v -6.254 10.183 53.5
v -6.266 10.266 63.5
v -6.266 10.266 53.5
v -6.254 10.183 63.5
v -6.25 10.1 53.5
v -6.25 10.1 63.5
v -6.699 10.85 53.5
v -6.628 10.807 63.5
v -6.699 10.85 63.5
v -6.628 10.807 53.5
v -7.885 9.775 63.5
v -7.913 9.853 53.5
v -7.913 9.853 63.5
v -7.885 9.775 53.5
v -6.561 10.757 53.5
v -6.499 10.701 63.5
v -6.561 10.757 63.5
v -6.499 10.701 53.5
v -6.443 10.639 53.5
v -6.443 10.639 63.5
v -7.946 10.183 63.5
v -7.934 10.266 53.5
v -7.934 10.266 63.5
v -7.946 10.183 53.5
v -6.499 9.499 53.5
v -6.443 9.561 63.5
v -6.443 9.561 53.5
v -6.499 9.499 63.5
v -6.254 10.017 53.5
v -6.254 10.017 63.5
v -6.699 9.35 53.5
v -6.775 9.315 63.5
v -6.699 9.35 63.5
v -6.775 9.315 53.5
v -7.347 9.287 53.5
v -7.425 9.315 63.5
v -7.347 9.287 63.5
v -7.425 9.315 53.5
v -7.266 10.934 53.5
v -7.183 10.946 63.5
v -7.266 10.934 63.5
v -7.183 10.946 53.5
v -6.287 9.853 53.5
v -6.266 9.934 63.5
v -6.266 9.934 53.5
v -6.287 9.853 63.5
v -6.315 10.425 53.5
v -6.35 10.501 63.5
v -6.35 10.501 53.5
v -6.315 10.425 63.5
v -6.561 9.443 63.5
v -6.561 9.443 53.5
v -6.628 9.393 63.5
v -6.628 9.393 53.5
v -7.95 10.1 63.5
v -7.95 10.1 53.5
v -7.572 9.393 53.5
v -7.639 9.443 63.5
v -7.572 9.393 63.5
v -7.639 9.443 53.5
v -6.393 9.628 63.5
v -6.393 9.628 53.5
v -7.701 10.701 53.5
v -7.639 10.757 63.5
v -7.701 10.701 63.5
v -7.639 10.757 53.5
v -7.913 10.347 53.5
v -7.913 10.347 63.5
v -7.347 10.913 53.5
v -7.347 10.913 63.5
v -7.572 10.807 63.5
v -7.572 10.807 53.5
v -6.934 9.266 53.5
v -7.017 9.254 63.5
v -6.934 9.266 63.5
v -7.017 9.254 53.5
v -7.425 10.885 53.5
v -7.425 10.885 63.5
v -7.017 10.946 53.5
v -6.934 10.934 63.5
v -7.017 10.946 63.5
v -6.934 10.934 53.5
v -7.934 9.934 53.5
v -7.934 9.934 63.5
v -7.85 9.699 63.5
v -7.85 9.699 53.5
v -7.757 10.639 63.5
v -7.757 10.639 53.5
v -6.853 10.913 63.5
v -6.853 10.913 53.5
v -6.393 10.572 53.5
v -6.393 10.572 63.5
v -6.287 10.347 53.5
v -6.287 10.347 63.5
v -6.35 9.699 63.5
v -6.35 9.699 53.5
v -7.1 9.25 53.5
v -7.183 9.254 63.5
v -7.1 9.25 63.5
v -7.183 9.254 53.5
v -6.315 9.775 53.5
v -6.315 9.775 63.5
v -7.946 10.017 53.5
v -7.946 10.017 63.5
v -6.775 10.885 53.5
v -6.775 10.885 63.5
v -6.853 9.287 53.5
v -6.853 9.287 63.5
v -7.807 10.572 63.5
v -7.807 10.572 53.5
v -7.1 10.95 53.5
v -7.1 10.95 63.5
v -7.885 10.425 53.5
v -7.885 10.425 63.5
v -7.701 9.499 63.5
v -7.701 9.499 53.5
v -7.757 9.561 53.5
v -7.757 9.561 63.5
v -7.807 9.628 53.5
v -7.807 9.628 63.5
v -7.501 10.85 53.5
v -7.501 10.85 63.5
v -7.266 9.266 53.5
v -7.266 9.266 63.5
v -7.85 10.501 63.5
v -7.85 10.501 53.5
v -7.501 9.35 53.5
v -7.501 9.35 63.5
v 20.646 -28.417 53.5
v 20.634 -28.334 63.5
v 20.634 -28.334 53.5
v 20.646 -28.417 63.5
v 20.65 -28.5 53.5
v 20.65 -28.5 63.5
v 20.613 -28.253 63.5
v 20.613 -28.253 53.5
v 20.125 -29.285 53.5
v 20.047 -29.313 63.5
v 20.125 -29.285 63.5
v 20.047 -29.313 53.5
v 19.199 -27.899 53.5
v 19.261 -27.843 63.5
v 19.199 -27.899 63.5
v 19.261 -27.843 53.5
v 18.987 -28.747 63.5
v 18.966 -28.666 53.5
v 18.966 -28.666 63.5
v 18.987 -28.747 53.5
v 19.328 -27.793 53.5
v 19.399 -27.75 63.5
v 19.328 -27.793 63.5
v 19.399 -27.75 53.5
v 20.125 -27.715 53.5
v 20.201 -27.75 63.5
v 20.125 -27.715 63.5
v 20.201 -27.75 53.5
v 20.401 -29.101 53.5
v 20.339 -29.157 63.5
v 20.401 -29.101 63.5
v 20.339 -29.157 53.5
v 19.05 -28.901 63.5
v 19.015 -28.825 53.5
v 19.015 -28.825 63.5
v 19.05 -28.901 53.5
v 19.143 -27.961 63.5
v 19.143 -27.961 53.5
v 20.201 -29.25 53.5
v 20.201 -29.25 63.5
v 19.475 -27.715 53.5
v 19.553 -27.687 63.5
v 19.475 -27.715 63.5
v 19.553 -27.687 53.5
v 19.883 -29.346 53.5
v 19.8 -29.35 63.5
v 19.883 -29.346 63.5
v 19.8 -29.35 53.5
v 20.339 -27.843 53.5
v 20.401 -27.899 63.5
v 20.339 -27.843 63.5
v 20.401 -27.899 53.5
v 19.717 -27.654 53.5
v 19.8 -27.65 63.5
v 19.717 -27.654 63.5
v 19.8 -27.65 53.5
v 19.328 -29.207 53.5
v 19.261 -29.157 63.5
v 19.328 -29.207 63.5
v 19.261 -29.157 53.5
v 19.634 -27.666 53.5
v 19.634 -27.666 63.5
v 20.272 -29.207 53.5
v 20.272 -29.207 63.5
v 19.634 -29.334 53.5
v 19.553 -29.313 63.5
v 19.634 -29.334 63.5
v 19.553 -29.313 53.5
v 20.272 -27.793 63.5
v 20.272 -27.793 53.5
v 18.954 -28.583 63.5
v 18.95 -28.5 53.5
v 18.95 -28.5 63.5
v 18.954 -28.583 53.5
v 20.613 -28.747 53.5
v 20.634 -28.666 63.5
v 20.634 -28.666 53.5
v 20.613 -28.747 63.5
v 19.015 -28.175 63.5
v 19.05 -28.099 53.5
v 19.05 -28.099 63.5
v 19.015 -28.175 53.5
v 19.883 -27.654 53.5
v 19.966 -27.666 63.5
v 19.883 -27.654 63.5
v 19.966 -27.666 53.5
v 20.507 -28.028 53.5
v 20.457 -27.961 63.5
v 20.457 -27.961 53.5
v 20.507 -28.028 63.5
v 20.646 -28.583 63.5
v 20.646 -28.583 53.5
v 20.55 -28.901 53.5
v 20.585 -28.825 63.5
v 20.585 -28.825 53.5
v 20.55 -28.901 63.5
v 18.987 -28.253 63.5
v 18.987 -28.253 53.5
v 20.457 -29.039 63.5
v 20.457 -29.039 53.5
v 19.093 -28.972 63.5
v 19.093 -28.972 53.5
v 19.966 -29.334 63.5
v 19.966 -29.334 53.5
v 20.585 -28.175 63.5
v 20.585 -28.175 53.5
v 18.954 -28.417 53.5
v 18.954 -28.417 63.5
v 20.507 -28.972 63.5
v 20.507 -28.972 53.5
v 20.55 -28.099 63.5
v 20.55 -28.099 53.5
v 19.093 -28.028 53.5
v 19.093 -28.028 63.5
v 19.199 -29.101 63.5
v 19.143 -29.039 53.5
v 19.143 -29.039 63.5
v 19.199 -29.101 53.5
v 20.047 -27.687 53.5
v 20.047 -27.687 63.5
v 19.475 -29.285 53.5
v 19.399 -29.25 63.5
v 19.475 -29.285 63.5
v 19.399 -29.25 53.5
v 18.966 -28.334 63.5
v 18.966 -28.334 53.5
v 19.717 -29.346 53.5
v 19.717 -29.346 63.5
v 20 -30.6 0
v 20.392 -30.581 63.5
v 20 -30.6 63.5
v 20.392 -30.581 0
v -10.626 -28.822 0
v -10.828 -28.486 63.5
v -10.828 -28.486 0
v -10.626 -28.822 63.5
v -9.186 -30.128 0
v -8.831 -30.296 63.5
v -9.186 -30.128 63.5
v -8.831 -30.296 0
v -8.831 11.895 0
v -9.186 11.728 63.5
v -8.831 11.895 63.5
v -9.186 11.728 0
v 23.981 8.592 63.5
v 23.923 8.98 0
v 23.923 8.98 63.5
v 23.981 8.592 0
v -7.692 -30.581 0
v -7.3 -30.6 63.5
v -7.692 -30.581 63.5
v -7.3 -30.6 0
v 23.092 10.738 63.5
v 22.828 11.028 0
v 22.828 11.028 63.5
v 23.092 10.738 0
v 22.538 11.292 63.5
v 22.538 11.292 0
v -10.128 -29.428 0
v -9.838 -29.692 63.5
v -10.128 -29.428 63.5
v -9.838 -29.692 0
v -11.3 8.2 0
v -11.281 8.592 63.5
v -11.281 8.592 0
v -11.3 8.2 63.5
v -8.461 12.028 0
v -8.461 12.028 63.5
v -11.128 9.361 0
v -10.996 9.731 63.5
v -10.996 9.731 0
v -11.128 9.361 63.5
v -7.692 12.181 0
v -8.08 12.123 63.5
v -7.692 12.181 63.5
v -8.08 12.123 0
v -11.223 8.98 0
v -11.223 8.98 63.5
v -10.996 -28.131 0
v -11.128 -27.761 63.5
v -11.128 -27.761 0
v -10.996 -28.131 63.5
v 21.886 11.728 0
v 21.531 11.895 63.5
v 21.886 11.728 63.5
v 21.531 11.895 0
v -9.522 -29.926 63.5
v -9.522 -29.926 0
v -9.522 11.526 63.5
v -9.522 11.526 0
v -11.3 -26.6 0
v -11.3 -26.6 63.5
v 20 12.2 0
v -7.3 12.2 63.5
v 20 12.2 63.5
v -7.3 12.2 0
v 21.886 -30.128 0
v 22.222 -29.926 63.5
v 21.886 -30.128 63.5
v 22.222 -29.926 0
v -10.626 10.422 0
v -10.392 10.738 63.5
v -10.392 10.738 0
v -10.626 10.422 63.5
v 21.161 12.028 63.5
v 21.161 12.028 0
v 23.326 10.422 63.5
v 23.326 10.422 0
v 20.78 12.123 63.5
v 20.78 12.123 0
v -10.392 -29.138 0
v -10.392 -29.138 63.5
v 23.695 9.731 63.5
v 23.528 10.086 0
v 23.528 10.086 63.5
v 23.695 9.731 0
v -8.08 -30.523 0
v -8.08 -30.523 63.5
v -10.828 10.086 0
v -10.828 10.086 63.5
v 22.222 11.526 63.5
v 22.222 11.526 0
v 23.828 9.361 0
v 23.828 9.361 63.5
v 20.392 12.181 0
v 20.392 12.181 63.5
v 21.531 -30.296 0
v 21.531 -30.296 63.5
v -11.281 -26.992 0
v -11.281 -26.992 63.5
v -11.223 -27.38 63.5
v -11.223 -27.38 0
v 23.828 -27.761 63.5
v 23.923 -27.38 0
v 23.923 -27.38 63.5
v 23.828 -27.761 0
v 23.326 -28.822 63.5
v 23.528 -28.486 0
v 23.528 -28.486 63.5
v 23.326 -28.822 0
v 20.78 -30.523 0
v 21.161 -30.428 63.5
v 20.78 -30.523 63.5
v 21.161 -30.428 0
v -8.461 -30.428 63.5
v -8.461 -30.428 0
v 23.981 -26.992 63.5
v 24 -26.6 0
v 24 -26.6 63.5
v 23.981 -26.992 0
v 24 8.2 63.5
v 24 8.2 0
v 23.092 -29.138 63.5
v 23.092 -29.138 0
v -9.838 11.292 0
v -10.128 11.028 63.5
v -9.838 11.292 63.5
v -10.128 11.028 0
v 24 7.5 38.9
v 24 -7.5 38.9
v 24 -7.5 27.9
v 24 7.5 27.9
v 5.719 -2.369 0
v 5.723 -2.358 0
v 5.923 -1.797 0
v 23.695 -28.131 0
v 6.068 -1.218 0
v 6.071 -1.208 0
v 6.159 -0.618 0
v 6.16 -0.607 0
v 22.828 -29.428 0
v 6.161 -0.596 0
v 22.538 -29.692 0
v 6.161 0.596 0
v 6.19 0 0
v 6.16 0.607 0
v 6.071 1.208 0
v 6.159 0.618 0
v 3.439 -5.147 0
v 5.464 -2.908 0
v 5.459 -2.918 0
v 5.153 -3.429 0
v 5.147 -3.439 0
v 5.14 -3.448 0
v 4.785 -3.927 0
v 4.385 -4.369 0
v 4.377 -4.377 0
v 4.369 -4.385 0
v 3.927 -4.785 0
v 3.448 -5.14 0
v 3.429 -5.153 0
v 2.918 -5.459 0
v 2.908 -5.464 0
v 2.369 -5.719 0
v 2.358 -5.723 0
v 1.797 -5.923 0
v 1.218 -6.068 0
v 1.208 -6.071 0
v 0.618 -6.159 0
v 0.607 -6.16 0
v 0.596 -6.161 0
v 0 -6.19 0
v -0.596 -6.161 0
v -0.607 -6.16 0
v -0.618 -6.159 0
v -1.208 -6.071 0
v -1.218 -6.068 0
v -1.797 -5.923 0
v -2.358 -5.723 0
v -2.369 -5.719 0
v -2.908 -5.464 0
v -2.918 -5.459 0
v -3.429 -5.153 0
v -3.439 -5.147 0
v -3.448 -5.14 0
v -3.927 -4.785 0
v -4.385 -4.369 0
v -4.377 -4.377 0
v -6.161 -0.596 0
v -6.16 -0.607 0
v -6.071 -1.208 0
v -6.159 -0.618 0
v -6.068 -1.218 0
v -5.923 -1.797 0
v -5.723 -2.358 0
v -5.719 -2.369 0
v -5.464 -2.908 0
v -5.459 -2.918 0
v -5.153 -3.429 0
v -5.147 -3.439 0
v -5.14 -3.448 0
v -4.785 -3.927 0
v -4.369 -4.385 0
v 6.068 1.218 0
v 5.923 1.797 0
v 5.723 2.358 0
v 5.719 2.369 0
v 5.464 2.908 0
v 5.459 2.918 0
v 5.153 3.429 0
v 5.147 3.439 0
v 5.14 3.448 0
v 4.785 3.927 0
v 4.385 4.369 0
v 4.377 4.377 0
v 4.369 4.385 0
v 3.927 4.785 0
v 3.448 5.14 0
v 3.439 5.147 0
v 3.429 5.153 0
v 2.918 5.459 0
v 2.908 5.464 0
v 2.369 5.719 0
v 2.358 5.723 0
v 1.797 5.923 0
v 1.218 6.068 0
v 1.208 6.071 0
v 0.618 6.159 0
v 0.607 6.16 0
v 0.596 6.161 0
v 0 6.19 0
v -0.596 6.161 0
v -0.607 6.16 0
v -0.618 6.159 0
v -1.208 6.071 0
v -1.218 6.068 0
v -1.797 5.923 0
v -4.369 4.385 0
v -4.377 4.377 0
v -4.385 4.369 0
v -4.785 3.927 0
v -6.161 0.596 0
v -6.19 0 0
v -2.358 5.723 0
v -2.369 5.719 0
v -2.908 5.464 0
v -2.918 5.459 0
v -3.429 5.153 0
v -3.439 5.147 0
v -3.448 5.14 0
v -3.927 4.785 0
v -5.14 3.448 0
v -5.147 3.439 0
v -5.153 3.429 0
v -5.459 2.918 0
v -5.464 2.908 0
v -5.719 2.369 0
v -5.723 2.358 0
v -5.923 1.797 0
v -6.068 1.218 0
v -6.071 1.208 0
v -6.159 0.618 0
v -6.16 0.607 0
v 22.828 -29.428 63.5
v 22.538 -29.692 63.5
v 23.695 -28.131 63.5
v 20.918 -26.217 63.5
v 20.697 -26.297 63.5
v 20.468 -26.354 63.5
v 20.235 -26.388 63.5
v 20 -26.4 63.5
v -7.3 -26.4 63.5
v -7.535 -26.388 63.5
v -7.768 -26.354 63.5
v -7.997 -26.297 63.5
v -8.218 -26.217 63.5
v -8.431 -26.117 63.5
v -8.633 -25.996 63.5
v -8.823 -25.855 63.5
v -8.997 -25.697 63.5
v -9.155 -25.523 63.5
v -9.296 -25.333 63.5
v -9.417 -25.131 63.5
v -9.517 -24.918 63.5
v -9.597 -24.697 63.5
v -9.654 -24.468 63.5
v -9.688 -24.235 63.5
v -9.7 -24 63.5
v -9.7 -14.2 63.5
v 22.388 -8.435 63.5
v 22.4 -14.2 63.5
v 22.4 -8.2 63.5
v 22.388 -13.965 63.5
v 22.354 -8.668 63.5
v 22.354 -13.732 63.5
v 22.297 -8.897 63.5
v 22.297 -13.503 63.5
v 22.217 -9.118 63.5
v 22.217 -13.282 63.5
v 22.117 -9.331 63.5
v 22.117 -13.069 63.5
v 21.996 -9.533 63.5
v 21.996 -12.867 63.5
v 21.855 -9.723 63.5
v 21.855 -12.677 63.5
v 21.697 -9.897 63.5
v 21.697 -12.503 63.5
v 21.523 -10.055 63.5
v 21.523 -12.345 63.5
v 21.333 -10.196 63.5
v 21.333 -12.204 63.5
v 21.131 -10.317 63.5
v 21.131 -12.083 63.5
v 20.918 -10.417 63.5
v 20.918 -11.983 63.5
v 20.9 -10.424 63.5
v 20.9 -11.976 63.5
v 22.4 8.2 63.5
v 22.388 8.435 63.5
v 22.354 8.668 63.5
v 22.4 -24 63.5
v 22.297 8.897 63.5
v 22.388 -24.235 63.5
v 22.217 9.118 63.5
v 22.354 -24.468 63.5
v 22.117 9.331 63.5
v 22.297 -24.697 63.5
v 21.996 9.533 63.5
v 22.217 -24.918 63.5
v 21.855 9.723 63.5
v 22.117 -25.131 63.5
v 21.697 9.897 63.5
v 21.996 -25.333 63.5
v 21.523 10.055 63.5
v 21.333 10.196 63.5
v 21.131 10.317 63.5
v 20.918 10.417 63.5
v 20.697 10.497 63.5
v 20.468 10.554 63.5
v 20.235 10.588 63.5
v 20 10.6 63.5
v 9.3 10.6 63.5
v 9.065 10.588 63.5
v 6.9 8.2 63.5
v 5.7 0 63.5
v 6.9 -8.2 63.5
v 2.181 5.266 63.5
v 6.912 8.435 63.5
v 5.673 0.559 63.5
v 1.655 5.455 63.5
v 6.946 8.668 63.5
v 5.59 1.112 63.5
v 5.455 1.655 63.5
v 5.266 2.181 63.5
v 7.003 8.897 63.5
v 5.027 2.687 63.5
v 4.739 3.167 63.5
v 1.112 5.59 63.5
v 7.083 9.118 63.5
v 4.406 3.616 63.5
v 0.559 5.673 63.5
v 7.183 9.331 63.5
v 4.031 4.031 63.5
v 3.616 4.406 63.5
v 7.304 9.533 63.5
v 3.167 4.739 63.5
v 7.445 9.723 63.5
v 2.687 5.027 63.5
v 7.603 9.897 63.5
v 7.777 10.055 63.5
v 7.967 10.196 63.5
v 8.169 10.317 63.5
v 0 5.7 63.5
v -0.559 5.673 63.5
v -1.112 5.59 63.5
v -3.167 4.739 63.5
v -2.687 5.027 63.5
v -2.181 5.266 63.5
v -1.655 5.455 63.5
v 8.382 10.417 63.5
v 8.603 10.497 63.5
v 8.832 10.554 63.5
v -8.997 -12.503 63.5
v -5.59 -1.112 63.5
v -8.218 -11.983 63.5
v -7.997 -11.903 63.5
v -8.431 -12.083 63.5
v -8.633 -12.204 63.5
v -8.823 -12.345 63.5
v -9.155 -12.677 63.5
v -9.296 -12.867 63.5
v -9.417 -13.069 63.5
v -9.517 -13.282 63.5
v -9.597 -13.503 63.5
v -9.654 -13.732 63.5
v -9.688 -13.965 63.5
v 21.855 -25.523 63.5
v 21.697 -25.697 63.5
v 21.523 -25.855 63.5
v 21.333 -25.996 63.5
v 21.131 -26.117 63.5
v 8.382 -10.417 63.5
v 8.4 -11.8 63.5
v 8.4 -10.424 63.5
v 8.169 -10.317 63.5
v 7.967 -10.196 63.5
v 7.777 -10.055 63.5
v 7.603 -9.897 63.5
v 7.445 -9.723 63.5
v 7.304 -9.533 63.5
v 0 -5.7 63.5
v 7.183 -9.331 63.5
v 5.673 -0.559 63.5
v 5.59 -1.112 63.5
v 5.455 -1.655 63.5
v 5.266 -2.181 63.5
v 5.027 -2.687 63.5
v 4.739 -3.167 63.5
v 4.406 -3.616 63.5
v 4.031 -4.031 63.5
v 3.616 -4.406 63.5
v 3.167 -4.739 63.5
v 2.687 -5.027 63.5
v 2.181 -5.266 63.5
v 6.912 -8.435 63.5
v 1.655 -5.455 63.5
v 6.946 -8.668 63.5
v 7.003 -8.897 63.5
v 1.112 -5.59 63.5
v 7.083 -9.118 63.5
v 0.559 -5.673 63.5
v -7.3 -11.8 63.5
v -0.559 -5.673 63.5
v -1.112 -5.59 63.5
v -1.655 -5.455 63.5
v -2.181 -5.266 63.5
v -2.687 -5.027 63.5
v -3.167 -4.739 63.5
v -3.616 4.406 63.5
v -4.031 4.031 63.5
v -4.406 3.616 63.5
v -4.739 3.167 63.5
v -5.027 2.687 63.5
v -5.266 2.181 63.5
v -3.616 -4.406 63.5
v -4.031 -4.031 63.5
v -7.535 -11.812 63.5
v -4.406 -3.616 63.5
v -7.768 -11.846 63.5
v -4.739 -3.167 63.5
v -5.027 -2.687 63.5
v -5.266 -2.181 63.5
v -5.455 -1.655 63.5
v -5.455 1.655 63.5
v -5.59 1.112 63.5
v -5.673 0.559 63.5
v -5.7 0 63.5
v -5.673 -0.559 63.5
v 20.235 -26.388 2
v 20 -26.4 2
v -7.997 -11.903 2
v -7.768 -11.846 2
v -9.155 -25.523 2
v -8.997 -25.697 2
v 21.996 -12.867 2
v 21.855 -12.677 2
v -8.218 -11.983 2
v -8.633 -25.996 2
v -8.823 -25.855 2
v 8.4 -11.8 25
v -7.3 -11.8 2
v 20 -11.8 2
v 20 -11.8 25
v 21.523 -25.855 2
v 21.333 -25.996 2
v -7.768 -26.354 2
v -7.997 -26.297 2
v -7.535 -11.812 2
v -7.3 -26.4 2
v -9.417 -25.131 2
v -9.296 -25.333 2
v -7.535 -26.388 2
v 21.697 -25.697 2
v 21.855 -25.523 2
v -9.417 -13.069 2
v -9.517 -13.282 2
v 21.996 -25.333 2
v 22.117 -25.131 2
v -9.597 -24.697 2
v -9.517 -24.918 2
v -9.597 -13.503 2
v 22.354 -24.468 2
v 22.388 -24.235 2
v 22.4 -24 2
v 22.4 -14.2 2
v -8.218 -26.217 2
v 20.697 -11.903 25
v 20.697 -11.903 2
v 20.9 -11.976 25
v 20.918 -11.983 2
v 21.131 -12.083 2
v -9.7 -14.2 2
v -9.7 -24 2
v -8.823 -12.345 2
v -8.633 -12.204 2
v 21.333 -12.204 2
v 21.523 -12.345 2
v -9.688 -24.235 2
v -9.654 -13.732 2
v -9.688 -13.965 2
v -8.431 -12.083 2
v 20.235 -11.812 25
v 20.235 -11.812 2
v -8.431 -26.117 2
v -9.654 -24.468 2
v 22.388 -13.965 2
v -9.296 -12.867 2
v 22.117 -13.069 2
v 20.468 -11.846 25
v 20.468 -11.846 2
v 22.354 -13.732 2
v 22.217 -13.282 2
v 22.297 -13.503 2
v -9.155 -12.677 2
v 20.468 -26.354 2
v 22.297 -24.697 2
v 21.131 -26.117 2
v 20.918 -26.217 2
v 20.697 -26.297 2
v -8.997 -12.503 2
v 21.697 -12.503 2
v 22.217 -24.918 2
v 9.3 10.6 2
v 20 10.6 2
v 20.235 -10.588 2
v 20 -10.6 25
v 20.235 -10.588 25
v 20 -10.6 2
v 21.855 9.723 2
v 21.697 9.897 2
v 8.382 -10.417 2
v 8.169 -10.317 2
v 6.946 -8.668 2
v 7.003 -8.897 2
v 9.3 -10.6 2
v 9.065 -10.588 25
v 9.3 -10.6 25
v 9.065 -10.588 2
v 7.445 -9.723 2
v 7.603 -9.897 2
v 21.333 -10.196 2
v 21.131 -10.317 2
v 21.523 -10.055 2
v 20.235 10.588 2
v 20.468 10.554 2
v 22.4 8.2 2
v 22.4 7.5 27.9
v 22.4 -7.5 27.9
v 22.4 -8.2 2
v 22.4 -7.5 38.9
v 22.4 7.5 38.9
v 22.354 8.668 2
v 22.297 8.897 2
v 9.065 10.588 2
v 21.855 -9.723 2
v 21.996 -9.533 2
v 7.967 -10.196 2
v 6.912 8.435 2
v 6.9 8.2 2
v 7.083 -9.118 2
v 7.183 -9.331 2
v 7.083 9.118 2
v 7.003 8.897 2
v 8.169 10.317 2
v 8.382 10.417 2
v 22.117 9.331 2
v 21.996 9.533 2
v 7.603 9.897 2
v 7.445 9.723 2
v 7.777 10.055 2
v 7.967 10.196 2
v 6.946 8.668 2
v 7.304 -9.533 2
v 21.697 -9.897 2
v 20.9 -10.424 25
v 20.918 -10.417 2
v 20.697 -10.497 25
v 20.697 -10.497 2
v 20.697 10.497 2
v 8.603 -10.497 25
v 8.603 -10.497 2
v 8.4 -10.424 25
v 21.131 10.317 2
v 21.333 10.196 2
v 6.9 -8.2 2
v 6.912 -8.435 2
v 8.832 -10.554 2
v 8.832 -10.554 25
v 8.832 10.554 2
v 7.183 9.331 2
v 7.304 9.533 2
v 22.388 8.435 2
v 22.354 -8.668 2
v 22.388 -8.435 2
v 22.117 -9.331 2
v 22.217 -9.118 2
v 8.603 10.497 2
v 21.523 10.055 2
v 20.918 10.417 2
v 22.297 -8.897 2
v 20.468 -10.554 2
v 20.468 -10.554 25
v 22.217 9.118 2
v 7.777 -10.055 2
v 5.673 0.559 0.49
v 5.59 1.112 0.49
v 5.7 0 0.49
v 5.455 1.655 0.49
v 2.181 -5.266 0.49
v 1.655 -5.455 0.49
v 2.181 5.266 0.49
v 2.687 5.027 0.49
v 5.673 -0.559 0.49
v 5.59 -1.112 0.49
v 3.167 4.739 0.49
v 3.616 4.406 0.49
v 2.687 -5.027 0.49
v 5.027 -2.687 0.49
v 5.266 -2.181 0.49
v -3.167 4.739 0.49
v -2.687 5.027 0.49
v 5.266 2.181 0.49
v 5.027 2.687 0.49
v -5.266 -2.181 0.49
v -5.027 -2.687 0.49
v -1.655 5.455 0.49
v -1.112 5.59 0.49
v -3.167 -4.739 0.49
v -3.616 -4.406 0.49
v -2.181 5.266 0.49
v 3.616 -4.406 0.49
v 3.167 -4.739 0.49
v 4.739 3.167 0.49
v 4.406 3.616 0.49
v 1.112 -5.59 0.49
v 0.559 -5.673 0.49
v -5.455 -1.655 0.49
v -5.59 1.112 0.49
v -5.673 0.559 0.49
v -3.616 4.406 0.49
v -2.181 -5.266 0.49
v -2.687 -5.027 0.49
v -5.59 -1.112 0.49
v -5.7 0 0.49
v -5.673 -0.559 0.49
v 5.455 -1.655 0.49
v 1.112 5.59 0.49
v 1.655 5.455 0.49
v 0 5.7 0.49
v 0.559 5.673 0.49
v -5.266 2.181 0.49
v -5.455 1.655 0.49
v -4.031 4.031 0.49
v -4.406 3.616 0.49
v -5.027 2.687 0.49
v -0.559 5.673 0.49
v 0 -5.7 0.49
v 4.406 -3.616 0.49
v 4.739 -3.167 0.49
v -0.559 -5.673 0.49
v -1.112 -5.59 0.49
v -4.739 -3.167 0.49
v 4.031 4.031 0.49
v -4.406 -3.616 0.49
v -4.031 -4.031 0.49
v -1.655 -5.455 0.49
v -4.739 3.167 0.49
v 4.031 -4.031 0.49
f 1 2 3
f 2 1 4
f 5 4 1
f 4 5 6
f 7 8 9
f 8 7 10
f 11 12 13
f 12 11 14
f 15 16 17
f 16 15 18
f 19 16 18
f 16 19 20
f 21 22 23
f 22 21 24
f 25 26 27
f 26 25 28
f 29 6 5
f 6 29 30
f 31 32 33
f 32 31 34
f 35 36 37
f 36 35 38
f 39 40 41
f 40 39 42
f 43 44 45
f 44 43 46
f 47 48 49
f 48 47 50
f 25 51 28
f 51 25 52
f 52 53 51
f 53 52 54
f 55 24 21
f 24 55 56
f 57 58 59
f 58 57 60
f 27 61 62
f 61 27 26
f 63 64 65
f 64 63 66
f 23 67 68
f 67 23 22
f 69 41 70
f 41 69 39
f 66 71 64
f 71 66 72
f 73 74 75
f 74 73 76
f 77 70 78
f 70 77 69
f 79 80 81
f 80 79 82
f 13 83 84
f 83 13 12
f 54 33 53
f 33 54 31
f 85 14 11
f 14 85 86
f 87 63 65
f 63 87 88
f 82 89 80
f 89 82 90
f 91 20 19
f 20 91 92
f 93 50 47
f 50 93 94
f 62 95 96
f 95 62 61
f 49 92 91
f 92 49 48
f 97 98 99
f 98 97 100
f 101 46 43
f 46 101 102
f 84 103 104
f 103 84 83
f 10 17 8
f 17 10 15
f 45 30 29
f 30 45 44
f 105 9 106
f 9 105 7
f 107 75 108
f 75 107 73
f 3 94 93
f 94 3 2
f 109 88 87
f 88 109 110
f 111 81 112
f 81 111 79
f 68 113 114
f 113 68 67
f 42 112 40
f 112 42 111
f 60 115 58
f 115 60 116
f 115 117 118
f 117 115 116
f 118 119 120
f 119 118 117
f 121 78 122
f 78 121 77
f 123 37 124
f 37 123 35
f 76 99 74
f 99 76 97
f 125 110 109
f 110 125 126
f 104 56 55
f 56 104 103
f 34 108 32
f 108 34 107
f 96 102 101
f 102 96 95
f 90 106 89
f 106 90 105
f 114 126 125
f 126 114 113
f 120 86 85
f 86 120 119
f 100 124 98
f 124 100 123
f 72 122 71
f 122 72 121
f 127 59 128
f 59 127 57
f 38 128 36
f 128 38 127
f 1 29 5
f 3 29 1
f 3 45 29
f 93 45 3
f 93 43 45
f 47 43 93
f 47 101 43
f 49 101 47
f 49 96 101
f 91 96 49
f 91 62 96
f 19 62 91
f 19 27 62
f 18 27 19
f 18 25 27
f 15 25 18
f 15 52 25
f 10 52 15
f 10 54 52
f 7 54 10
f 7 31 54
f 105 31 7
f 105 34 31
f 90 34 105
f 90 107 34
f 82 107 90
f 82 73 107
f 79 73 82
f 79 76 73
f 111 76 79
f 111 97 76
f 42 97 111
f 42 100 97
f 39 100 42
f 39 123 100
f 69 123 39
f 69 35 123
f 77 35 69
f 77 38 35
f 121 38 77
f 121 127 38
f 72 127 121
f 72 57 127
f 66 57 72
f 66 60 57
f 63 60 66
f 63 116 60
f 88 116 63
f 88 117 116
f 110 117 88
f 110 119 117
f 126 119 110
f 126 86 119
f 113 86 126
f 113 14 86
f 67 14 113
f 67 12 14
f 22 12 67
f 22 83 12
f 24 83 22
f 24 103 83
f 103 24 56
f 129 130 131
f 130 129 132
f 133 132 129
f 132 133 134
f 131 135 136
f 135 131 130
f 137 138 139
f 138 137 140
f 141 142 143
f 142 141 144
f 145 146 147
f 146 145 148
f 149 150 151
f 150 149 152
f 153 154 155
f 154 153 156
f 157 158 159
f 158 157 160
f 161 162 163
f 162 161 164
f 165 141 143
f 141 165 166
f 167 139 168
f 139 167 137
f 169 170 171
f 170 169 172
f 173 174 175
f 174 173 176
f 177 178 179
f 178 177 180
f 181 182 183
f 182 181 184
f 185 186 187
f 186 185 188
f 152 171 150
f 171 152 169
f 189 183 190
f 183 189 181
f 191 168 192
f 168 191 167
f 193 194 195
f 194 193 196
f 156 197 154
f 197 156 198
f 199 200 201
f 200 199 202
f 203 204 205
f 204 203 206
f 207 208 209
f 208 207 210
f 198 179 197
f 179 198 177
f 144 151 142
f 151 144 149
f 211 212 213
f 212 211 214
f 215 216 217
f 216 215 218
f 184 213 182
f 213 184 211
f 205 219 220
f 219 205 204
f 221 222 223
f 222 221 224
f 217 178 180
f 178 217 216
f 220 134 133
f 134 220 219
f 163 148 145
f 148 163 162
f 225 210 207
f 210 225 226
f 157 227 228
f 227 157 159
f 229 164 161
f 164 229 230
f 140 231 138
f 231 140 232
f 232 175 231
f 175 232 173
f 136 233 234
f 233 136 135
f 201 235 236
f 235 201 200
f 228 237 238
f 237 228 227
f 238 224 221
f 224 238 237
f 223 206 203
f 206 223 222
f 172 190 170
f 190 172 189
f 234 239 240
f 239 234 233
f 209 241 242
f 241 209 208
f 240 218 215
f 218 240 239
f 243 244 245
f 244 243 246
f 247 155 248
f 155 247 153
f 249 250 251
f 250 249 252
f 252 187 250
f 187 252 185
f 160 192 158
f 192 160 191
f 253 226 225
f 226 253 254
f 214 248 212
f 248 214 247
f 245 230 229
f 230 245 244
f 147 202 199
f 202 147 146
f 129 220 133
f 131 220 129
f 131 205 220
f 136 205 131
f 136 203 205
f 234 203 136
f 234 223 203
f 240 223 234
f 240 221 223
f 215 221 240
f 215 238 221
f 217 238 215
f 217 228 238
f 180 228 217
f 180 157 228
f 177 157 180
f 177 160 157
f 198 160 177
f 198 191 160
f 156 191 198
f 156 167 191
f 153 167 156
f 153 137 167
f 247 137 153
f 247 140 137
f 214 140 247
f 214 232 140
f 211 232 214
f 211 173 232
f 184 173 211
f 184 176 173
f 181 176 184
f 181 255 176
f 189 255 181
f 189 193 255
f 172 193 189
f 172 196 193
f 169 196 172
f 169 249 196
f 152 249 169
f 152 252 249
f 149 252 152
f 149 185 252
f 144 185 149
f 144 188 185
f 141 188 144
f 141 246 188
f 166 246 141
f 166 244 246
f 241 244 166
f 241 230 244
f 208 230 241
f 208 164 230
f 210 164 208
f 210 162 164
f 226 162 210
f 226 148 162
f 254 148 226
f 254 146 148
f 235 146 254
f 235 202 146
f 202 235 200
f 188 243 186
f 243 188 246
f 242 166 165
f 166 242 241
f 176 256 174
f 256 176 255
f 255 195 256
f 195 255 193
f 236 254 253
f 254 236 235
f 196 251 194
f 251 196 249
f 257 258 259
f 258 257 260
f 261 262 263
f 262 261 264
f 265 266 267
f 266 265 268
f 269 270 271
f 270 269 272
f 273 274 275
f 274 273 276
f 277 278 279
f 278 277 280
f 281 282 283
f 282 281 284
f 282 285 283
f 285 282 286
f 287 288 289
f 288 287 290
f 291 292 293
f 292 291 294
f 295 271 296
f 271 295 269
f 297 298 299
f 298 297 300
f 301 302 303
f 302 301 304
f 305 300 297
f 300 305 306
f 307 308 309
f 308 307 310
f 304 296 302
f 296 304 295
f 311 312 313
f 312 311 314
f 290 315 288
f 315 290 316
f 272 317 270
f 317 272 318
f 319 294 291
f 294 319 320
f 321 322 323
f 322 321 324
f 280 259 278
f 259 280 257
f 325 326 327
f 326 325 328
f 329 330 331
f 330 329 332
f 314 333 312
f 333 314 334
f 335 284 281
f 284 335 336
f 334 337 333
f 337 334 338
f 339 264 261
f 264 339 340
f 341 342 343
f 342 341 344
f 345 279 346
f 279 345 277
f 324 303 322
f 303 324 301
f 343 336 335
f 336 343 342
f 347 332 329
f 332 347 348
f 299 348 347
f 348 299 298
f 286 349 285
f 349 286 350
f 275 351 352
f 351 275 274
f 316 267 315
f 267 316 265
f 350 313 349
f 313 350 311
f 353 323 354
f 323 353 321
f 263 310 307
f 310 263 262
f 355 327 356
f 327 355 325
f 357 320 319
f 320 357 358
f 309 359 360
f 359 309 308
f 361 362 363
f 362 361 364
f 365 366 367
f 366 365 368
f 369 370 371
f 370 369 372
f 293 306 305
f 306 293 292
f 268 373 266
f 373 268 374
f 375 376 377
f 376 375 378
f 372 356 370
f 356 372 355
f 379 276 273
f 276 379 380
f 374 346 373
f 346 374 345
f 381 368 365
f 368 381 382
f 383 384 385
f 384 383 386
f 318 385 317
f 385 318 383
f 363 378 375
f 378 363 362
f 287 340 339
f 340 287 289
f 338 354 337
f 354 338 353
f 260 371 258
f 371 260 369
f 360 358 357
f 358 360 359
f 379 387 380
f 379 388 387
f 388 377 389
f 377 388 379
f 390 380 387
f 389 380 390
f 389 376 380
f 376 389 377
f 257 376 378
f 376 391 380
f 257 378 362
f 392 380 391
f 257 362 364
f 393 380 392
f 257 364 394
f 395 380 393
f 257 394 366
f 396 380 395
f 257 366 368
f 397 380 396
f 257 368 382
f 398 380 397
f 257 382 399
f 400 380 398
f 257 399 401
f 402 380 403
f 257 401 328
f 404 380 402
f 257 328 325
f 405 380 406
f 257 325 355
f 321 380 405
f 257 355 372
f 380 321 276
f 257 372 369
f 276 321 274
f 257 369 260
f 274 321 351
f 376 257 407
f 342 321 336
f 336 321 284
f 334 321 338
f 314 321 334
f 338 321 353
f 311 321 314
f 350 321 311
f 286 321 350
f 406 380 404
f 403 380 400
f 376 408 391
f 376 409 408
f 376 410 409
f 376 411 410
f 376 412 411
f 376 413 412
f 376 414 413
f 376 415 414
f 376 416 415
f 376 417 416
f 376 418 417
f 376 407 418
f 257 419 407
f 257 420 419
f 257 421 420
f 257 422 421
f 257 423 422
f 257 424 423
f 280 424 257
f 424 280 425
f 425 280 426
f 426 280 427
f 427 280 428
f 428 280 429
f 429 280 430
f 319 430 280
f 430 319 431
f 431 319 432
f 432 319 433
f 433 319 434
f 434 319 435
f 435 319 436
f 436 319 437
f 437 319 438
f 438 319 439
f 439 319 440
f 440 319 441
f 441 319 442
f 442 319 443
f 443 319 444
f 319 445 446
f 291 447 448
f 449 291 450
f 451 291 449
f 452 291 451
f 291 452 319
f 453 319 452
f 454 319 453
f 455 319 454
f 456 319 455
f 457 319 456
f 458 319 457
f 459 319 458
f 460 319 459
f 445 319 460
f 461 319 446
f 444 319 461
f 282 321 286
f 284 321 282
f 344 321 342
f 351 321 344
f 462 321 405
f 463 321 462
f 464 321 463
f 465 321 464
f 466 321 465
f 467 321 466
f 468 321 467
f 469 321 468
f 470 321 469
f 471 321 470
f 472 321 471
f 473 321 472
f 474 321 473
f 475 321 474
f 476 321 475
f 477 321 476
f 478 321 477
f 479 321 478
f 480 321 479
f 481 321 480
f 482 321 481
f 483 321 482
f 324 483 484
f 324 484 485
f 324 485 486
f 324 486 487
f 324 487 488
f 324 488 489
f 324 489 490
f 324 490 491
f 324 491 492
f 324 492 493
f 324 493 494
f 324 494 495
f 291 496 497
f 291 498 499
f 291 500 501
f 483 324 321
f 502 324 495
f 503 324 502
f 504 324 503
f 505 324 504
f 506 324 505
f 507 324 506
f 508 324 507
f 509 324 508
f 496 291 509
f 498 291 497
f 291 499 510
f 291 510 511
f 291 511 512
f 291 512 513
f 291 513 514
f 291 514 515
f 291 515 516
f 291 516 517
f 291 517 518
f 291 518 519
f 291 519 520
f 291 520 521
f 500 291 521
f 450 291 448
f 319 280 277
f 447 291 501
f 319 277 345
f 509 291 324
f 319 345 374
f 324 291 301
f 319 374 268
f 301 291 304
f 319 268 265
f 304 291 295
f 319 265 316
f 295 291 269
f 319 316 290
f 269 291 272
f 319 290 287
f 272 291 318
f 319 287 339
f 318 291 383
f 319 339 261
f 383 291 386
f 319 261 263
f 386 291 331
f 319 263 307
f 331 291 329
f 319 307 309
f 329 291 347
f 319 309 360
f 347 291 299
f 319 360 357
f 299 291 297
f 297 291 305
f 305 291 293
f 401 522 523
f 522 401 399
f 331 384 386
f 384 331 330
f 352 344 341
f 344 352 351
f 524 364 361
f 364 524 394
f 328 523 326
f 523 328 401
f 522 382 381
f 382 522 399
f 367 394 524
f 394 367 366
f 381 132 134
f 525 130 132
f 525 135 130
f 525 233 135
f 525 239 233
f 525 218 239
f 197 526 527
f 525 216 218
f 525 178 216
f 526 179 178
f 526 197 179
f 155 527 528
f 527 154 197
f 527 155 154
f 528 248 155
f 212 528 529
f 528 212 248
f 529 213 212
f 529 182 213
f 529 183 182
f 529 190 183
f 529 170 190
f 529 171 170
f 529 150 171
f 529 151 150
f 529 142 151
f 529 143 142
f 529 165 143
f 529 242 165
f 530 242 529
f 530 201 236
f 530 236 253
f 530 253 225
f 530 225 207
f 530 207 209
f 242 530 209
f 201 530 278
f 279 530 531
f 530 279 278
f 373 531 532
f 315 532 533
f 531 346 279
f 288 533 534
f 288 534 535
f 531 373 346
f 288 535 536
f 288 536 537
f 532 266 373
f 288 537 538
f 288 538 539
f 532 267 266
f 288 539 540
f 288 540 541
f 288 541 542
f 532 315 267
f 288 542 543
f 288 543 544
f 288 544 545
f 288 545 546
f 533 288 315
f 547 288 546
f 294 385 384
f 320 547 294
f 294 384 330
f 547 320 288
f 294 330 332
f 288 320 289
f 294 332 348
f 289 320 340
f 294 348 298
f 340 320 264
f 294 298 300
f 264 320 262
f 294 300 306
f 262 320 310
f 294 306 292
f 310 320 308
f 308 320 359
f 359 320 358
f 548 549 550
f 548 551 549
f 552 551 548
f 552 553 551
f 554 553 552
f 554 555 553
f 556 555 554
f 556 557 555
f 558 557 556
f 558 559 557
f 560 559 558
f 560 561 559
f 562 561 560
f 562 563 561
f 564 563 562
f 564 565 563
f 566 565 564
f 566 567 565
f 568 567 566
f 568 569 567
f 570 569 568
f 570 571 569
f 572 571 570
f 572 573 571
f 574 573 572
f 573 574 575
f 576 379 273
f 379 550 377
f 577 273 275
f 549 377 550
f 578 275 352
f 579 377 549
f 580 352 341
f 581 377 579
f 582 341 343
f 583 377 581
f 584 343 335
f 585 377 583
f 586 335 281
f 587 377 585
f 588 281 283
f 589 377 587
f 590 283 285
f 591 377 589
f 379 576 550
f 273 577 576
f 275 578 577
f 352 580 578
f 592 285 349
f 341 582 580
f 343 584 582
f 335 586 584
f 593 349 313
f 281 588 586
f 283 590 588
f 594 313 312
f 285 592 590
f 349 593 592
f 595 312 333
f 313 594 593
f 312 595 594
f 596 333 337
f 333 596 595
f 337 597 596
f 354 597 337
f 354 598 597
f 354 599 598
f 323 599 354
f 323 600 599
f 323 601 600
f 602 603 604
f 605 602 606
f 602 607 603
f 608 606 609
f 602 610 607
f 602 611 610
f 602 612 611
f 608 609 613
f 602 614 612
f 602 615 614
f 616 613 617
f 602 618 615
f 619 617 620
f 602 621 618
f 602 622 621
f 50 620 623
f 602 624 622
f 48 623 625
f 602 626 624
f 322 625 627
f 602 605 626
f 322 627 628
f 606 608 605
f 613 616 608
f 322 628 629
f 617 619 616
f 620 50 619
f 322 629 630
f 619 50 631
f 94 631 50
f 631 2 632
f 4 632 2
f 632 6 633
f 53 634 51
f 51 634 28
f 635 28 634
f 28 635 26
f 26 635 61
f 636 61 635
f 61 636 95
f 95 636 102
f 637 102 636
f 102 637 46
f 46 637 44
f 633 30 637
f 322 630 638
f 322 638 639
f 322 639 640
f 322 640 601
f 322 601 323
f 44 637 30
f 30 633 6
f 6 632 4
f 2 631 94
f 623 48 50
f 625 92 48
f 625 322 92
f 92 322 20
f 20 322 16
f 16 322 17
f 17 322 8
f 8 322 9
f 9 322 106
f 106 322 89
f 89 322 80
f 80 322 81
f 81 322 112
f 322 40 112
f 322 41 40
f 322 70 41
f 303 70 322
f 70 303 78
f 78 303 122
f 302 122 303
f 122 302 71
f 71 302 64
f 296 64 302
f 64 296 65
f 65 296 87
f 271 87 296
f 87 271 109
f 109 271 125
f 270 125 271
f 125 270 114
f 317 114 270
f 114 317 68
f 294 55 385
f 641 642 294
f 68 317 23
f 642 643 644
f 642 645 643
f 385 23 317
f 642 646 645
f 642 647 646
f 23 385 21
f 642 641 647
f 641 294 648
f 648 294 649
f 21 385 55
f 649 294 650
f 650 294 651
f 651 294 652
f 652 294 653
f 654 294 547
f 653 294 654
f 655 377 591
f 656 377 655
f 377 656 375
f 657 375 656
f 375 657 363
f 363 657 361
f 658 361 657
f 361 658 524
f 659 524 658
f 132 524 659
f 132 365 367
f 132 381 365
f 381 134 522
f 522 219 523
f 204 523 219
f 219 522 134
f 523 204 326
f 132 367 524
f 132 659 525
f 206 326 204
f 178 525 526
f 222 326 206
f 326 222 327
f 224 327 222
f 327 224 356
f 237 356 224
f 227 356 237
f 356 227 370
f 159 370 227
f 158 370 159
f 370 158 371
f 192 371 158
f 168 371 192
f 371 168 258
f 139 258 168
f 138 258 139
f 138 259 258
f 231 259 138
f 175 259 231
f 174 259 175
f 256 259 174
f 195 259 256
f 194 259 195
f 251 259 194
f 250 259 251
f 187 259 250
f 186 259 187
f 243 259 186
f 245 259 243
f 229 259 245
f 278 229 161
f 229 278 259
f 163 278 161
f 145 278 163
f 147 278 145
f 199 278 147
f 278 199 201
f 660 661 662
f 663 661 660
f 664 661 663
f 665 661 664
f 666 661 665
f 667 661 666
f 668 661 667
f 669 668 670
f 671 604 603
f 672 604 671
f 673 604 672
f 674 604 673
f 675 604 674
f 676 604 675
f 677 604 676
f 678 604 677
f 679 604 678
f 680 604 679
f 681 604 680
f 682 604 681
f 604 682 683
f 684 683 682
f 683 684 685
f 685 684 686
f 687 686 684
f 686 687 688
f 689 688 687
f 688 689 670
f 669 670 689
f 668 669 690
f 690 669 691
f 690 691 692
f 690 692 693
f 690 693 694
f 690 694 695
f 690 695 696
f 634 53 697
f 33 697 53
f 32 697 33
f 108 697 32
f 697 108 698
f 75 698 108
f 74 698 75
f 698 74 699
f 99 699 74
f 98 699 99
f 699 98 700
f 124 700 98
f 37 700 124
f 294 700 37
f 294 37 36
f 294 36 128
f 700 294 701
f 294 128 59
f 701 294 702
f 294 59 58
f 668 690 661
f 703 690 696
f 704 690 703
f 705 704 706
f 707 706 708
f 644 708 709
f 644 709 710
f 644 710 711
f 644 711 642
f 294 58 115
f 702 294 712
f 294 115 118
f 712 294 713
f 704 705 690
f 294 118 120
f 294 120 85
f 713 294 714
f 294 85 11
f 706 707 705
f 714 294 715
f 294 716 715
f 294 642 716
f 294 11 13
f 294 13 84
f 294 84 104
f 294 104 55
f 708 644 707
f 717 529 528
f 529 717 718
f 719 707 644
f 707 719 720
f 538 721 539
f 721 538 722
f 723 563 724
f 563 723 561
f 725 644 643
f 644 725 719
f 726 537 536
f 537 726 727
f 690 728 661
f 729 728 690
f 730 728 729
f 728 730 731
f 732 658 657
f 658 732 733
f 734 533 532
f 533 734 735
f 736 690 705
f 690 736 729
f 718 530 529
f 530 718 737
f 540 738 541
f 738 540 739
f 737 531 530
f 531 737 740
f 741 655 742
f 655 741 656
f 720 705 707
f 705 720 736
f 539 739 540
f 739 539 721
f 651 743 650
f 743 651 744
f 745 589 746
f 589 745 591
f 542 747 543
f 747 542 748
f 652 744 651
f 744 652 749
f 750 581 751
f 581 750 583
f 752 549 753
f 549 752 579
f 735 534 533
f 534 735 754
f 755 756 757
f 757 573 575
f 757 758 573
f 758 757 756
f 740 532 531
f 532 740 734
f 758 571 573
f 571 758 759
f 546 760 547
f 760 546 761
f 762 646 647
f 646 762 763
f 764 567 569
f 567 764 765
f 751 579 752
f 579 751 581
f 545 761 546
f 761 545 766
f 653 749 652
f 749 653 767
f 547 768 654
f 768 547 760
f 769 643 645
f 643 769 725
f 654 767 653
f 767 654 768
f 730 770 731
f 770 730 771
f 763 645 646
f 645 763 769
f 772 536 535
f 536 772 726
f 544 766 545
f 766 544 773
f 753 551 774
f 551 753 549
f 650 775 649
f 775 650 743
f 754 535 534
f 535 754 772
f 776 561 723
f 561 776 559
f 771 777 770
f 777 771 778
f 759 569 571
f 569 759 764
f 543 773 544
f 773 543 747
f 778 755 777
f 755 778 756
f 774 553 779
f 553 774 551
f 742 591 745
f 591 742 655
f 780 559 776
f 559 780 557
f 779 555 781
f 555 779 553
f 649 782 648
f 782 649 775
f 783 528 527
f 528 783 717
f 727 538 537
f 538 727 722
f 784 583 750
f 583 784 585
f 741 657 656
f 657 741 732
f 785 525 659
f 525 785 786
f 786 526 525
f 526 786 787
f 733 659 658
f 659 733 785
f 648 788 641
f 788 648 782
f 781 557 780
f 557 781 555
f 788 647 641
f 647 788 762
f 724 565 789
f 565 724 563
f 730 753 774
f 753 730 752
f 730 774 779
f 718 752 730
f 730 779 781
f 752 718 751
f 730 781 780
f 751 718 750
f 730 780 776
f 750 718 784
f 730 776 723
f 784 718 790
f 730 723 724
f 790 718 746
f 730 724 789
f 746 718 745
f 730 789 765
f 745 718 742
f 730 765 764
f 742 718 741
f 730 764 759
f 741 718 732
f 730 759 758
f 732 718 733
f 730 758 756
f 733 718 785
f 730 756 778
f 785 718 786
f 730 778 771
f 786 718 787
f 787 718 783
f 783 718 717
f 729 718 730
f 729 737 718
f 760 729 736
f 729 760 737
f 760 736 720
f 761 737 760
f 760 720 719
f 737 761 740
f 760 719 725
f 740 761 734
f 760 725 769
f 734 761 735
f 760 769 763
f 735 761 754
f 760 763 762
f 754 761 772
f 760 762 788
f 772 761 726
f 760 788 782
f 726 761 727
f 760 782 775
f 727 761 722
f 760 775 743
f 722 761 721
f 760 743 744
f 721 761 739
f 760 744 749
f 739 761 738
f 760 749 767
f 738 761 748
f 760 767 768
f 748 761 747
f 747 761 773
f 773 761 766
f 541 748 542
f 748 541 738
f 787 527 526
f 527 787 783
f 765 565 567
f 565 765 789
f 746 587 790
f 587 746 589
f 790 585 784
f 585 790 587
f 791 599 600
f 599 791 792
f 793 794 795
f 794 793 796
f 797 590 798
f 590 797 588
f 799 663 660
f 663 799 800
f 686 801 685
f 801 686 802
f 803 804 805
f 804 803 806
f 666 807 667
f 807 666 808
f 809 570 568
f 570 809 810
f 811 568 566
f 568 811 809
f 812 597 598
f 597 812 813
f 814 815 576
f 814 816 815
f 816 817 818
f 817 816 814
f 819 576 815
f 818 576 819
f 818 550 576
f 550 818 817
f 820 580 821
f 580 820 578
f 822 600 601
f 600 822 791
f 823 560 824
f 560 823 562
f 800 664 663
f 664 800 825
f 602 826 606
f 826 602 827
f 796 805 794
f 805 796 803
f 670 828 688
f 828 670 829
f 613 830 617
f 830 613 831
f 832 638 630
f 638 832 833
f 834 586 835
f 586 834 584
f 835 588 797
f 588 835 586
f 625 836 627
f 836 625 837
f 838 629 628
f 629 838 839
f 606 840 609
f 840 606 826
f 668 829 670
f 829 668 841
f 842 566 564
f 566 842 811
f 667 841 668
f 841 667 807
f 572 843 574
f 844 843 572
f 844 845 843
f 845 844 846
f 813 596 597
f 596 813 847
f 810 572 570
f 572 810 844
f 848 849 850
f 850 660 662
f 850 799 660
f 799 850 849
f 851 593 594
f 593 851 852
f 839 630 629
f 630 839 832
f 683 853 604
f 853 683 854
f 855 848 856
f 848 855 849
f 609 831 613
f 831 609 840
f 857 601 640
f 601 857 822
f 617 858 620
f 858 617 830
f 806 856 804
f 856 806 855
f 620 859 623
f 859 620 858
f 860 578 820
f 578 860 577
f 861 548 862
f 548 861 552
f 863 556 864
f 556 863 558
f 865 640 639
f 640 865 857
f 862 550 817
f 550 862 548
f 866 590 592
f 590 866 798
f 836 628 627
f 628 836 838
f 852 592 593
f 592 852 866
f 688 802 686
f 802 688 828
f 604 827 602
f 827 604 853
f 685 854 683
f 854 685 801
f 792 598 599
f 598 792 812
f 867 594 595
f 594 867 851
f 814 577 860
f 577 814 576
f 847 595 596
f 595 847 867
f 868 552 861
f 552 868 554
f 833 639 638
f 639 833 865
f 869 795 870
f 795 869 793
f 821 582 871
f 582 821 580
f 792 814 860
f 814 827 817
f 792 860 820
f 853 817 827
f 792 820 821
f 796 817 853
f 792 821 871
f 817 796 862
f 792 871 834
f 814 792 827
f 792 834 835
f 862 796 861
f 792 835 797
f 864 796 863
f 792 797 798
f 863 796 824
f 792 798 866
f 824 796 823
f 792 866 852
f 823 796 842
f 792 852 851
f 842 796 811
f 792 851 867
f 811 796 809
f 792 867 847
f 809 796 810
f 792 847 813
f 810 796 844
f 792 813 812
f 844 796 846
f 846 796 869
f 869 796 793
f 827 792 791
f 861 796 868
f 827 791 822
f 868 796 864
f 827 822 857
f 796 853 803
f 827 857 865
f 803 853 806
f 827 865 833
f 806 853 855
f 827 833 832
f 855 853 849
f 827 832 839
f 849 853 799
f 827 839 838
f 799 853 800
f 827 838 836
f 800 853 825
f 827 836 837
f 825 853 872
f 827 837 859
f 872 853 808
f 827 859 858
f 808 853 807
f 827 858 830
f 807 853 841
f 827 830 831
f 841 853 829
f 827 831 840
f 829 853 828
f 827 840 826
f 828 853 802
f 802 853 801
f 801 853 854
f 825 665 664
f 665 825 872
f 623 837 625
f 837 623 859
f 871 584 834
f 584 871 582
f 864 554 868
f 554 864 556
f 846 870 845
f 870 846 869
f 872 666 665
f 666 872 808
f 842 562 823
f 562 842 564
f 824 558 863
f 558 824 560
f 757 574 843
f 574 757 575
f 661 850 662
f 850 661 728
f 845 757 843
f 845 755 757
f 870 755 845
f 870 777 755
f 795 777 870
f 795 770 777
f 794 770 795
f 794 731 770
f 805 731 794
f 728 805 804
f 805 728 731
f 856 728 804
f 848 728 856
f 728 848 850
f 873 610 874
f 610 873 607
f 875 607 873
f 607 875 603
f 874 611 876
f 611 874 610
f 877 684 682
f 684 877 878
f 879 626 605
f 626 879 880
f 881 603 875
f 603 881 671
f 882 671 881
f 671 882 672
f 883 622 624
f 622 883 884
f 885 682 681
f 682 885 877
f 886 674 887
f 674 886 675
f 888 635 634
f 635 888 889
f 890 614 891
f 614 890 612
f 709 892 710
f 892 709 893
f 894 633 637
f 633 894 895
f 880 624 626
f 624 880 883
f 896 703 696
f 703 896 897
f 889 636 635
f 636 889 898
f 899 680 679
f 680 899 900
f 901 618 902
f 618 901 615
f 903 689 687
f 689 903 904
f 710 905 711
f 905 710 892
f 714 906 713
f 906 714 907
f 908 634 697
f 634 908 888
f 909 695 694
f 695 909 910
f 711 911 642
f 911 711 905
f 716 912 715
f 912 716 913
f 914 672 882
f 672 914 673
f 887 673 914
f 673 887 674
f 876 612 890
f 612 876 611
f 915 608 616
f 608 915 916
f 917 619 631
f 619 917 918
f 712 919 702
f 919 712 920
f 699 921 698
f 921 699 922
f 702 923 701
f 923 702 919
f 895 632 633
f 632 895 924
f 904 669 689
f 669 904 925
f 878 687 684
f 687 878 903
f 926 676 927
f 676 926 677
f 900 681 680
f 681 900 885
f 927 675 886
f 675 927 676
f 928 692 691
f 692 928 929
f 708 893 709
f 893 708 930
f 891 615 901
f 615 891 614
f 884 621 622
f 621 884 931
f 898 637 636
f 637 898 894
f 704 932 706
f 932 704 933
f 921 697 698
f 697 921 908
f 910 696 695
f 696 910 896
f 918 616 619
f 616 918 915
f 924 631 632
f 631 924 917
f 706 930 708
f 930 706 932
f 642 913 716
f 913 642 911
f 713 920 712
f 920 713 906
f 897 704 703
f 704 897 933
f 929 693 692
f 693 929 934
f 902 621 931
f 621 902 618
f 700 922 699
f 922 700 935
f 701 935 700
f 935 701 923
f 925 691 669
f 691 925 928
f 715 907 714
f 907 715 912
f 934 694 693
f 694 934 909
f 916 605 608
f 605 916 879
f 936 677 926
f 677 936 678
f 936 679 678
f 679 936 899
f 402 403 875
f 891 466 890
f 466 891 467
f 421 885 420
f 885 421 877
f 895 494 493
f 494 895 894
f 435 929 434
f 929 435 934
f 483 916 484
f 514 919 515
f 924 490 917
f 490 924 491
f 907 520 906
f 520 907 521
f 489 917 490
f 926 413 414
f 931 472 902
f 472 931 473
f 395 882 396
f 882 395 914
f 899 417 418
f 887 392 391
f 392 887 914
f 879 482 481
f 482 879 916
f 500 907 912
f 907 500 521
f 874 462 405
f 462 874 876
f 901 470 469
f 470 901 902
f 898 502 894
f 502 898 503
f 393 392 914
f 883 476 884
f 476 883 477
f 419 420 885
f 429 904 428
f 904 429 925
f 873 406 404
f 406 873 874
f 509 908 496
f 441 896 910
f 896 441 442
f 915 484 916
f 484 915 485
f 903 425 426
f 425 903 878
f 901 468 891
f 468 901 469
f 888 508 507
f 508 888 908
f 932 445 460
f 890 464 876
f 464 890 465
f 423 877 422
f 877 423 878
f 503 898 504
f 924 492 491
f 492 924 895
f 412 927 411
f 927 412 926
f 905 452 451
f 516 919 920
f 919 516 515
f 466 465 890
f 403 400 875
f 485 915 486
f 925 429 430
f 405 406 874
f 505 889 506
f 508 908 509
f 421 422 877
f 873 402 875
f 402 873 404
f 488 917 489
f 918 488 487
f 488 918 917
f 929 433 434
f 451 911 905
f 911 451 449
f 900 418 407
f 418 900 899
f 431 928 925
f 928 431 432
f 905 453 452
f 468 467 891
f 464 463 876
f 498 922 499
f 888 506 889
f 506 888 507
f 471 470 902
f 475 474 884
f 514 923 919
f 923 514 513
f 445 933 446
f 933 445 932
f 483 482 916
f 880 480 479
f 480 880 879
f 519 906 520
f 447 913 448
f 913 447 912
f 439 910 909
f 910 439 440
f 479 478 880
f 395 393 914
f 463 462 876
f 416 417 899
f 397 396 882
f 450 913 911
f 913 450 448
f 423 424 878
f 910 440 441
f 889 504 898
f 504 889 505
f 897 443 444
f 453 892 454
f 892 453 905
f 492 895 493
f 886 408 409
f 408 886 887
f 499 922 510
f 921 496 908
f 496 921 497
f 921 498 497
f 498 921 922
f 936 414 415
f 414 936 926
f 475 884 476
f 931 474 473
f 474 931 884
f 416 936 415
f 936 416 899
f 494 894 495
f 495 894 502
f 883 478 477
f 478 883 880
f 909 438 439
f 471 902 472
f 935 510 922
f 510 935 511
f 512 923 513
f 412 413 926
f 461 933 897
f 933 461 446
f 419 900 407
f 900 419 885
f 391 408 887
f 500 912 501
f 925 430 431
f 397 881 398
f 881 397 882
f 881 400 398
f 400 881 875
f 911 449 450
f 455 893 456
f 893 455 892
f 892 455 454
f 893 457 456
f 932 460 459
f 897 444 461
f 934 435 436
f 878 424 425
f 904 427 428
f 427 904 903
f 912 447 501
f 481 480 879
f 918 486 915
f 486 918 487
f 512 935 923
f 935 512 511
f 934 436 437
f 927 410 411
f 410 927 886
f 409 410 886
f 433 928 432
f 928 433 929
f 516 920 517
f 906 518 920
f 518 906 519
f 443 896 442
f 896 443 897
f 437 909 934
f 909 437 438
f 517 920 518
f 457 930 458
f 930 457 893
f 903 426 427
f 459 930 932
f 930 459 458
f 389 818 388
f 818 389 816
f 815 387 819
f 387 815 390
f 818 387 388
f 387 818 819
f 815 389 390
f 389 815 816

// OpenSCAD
// Tremor Cue Pen - POD v7 (tall, not wide) - built from the photos
// Cross-section (looking from the back cap):
//      +---------------------------------+
//      |  MCU stack (NodeMCU + IMU + vib) |   top pocket, lying flat, USB at the back
//      +==========shelf=========+  gap  -+   shelf gap at the back = battery wires
//      | (pen)  |  battery pack on edge  |   TP4056 faces the pen, battery faces the right wall
//      +--------+------------------------+   switch handle pokes out a window in the right wall
// Both packs slide in from the BACK; back cap: a 6.8 mm deep sleeve over the protruding board ends,
// USB slot per pack, 2 x M2 self-tapping screws on the diagonal (bottom-left, top-right).
// Print: base standing on its FRONT face (pen axis vertical), cap flat, as exported. Supports OFF.
// PLA, 0.2 mm layers, 3 walls, 15% infill, 4 mm brim on the base.

part = "base";   // "base", "cap", "plate", "view", "clash_parts"

// measured packs [across (x), up (z), along the pen (y)]
mcu  = [30.5, 13.0, 59.3];        // NodeMCU flat, IMU + vibration module on top
batt = [13.9, 19.6, 30.8];        // battery pack on edge: TP4056 face toward the pen
clr  = 0.8;                       // per side

hole_comp = 0.30;  bore_free = 0.30;  pen_d = 10.8;     // bore that fit the Panda + rubber on v5
rb = (pen_d + hole_comp + bore_free) / 2;               // 5.7
rt = rb + 1.2;                                           // pen tube outer radius
wall = 1.6;  wall_top = 4.2;  front_t = 2.0;  cap_t = 2.4;  shelf_t = 1.2;   // thicker top wall carries a screw
r_out = 4.0;  r_pkt = r_out - wall;

// layout, pen axis at x = z = 0
bx = [rt, rt + batt[0] + 2*clr];                         // battery pocket x
bz = [-(batt[1] + 2*clr)/2, (batt[1] + 2*clr)/2];        // battery pocket z (pen centered on it)
mx = [bx[1] - (mcu[0] + 2*clr), bx[1]];                  // MCU pocket x (flush with the right side)
mz = [bz[1] + shelf_t, bz[1] + shelf_t + mcu[1] + 2*clr];
OX = [min(mx[0], -rt) - wall, bx[1] + wall];
OZ = [bz[0] - wall, mz[1] + wall_top];
pocket_L = mcu[2] + 2*clr + 0.6;
y_back = front_t + pocket_L;
gap_y0 = 25;                                             // shelf over the battery ends here: wires pass behind it
sc_in = [4.2, 2.1];                                     // screw inset from the corner [sideways, up/down]
screws = [[OX[0] + sc_in[0], OZ[0] + sc_in[1]], [OX[1] - sc_in[0], OZ[1] - sc_in[1]]];   // diagonal pair: bottom-left + top-right
pilot = 1.7;  m2_clear = 2.4;
usb_mcu = [12, 9];   usb_mcu_c = [(mx[0] + mx[1]) / 2, mz[1] - clr - 3.9];    // NodeMCU micro-USB: board at the TOP, USB just under it (photo)
usb_chg = [8, 12];   usb_chg_c = [bx[1] - 3.0, 0];                             // TP4056 micro-USB: faces the RIGHT wall (photo)
batt_front = y_back - clr - batt[2];                     // pack pushed to the back cap
sw_win = [11, 15];                                       // right-wall window for the switch [along y, z]
fudge = 0.01;  $fn = 64;

assert(mx[0] < -rt + 3, "MCU pocket does not cover the pen side");
assert(norm(screws[0]) > rt + pilot/2 + 1.0, "bottom screw breaks into the pen tube");
assert(screws[0][0] + pilot/2 + 1.0 <= mx[0] || screws[0][1] + pilot/2 + 1.0 <= bz[1], "bottom screw hits a pocket");
assert(screws[1][1] - pilot/2 - 1.0 >= mz[1], "top screw breaks into the MCU pocket");
assert(sc_in[1] - pilot/2 >= 1.2, "screws too close to the outer skin");

module box(xr, yr, zr) translate([xr[0], yr[0], zr[0]]) cube([xr[1]-xr[0], yr[1]-yr[0], zr[1]-zr[0]]);
module along_y(r, y0, y1) translate([0, y0, 0]) rotate([-90, 0, 0]) cylinder(r = r, h = y1 - y0);
module rbox(xr, yr, zr, r) translate([0, yr[0], 0]) rotate([-90, 0, 0]) linear_extrude(yr[1] - yr[0])
    translate([xr[0], -zr[1]]) offset(r = r) offset(delta = -r) square([xr[1] - xr[0], zr[1] - zr[0]]);
module rslot(c, sz, y0, y1) rbox([c[0] - sz[0]/2, c[0] + sz[0]/2], [y0, y1], [c[1] - sz[1]/2, c[1] + sz[1]/2], min(sz)/2 - fudge);

module base() difference() {
    rbox(OX, [0, y_back], OZ, r_out);
    rbox(mx, [front_t, y_back + 1], mz, r_pkt);                                     // MCU pocket
    rbox(bx, [front_t, y_back + 1], bz, r_pkt);                                     // battery pocket
    box([bx[0] + 1.5, bx[1] - 1.5], [gap_y0, y_back + 1], [bz[1] - 1, mz[0] + 1]);  // shelf gap: battery wires
    along_y(rb, -1, y_back + 1);                                                    // pen bore
    translate([0, -fudge, 0]) rotate([-90, 0, 0]) cylinder(r1 = rb + 0.5, r2 = rb, h = 0.5);
    for (s = screws) translate([s[0], y_back - 10, s[1]]) rotate([-90, 0, 0]) cylinder(d = pilot, h = 11);
    // switch window in the right wall, around the pack's front end
    rbox([bx[1] - 1, OX[1] + 1], [batt_front - 4, batt_front - 4 + sw_win[0]], [-sw_win[1]/2, sw_win[1]/2], 0.5);
}

// cap: a hollow sleeve that continues the base outline over the 6.6 mm the boards stick out
// of the back, then an end plate with the USB slots. Screws pass the full cap length.
skirt = 6.8;                                             // packs protrude 6.6 mm; 0.2 mm slack
cap_L = skirt + cap_t;
module cap() difference() {
    rbox(OX, [0, cap_L], OZ, r_out);
    rbox(mx, [-1, skirt], mz, r_pkt);                                              // continues the MCU pocket
    rbox(bx, [-1, skirt], bz, r_pkt);                                              // continues the battery pocket
    box([bx[0] + 1.5, bx[1] - 1.5], [-1, skirt], [bz[1] - 1, mz[0] + 1]);          // wires between the packs
    along_y(rb, -1, cap_L + 1);
    for (s = screws) translate([s[0], -1, s[1]]) rotate([-90, 0, 0]) {
        cylinder(d = m2_clear, h = cap_L + 2);
        translate([0, 0, cap_L + 1 - 1.2]) cylinder(d1 = m2_clear, d2 = 4.6, h = 1.2 + fudge);   // countersink, outer face
    }
    rslot(usb_mcu_c, usb_mcu, skirt - 1, cap_L + 1);
    rslot(usb_chg_c, usb_chg, skirt - 1, cap_L + 1);
}

module dummies() {
    color("royalblue")  box([mx[0] + clr, mx[1] - clr], [front_t + clr, front_t + clr + mcu[2]], [mz[0] + clr, mz[0] + clr + mcu[1]]);
    color("darkorange") box([bx[0] + clr, bx[1] - clr], [batt_front, y_back - clr], [bz[0] + clr, bz[1] - clr]);
}

module base_print() rotate([90, 0, 0]) base();                       // front face on the bed
module cap_print()  translate([0, 0, cap_L]) rotate([-90, 0, 0]) cap();   // outer face on the bed, sleeve up

if (part == "base")  base_print();
if (part == "cap")   cap_print();
if (part == "plate") { base_print(); translate([OX[1] - OX[0] + 8, 0, 0]) cap_print(); }
if (part == "view")  { color("seagreen") base(); dummies(); color("lightsteelblue", 0.5) translate([0, y_back + 0.3, 0]) cap();
                       color("gray", 0.4) along_y(pen_d/2, -40, y_back + 60); }
if (part == "clash_parts") intersection() { base(); dummies(); }
echo(str("Pod v7: ", OX[1] - OX[0], " W x ", OZ[1] - OZ[0], " H x ", y_back + cap_t, " L mm; pen axis ", -OX[0], " mm from the left, ", -OZ[0], " mm from the bottom"));
